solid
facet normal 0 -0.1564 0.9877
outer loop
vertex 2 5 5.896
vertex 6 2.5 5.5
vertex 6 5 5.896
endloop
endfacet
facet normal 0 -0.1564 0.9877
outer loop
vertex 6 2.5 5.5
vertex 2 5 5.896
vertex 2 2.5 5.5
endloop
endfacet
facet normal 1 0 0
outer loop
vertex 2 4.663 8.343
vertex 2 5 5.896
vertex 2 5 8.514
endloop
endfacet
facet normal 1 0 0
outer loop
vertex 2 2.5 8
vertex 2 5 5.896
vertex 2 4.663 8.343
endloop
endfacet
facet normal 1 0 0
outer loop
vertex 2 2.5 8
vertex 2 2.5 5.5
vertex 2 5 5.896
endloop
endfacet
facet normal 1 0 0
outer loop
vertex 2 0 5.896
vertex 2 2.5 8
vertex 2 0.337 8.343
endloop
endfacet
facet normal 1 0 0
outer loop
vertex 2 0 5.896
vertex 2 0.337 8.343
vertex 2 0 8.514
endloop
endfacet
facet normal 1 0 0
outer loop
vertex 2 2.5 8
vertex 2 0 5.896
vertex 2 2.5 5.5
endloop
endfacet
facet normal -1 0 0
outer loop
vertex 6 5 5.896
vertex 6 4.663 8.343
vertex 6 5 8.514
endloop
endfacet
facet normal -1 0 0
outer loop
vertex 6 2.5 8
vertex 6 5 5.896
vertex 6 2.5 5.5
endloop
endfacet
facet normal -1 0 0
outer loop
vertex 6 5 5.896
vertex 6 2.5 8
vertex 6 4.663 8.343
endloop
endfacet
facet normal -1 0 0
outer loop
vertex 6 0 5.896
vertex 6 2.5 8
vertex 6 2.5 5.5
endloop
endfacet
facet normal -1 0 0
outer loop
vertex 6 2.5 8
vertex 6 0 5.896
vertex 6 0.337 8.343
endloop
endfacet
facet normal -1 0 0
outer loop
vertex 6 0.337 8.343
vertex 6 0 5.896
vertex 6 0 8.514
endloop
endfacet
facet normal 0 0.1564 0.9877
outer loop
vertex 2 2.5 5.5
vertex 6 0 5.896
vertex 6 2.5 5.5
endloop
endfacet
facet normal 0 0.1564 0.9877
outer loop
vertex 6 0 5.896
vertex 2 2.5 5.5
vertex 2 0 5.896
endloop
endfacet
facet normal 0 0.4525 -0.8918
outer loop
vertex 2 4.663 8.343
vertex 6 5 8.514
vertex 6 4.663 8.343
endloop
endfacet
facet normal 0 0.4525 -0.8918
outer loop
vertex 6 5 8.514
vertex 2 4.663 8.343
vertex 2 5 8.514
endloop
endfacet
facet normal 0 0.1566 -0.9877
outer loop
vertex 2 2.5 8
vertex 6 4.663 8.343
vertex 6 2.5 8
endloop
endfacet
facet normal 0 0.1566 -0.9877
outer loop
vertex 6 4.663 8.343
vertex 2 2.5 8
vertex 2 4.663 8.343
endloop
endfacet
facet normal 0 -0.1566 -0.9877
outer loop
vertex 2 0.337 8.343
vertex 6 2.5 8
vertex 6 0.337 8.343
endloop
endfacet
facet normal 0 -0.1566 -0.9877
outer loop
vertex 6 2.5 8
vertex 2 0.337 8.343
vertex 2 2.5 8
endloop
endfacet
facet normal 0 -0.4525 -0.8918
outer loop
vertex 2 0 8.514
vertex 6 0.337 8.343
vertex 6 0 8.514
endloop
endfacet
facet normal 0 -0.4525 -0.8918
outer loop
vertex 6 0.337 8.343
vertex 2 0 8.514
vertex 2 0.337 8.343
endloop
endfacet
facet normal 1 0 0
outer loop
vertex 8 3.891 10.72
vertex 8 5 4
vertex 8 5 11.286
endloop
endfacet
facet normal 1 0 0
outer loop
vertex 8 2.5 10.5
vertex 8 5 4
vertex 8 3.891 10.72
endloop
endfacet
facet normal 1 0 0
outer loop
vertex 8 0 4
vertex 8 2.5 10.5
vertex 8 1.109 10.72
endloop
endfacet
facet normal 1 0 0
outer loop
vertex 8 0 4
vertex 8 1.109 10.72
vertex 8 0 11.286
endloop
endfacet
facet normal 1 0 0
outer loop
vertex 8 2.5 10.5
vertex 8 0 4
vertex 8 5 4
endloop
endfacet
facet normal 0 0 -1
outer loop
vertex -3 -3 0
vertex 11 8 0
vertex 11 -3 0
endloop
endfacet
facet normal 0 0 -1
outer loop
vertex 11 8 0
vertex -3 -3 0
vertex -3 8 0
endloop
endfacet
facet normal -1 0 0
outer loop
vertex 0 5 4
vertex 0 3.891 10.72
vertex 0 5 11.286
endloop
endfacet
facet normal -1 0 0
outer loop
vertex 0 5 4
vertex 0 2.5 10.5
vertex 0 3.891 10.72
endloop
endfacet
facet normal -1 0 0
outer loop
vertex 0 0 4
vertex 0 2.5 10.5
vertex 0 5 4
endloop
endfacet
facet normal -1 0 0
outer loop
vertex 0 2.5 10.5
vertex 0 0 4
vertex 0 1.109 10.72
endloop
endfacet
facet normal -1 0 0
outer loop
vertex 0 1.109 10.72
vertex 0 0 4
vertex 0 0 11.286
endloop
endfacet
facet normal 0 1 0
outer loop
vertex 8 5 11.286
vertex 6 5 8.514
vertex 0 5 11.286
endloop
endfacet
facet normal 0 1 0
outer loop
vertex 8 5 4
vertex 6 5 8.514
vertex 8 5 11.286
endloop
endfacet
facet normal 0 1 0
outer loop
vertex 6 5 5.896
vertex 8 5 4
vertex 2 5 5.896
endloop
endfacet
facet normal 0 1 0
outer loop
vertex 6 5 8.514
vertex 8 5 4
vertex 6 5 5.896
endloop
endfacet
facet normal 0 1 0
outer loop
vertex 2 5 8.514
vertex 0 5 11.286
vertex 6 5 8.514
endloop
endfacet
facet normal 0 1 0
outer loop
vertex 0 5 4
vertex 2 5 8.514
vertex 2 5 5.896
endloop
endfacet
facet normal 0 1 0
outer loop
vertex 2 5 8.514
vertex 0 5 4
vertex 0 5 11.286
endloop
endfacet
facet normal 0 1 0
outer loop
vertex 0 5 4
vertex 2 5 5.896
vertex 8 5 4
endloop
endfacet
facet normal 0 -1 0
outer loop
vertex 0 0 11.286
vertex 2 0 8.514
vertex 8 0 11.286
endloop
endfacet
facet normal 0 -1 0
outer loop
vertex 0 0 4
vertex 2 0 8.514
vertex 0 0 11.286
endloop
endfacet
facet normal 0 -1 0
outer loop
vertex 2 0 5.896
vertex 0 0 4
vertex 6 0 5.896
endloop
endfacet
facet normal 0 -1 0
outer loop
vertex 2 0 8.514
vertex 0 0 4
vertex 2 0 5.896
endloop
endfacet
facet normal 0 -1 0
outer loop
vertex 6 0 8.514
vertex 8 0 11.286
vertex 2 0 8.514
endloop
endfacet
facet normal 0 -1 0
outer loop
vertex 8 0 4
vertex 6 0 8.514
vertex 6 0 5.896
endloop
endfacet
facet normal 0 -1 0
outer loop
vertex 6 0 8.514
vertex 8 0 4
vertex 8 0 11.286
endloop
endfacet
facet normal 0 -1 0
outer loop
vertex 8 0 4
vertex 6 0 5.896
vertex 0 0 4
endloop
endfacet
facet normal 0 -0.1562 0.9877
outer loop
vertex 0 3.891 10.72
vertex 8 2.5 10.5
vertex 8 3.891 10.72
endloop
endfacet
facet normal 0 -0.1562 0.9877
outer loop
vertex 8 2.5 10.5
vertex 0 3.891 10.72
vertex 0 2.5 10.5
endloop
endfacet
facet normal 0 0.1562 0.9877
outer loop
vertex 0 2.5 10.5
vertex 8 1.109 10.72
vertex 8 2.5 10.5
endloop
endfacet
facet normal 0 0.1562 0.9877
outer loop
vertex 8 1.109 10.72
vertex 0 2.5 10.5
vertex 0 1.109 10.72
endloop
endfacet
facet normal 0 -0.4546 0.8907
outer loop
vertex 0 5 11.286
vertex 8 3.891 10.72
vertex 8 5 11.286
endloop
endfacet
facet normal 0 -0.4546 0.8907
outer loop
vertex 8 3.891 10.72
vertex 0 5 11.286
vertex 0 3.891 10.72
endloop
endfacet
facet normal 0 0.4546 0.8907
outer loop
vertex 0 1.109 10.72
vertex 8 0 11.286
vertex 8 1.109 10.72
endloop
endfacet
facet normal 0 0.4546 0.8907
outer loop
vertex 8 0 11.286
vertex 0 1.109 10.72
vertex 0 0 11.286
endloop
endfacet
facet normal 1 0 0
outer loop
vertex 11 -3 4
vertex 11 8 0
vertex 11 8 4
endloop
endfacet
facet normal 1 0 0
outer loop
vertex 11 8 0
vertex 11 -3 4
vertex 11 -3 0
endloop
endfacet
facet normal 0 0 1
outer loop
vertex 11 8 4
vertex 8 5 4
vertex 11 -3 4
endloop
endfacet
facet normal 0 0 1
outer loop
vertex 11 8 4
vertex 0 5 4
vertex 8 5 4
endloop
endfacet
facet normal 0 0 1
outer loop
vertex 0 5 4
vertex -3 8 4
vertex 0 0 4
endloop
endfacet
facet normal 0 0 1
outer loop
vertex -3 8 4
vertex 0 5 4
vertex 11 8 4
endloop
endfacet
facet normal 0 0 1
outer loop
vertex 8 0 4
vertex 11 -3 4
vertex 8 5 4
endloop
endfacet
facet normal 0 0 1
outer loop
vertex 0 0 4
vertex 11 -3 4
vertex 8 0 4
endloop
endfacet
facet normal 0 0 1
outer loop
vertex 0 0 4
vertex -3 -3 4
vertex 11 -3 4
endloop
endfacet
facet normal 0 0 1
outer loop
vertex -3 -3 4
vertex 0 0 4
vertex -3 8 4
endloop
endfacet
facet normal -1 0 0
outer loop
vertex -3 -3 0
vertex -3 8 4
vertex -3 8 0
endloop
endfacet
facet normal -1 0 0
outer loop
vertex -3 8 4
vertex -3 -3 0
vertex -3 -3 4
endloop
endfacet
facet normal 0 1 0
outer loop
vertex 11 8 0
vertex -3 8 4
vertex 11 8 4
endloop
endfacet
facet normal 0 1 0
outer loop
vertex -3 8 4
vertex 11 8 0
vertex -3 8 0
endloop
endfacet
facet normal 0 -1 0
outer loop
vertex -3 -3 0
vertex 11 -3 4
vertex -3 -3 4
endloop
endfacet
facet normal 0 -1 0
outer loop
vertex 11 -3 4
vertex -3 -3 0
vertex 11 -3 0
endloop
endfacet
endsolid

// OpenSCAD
h = 13;
s = 5;
del_s = 3;
r = s / 2 + 2;

del_r = 5;

h_ring = 4;
w_ring = 2.5;

del_h = 2;

render( convexity = 10 ) {

    translate( [ -del_s , -del_s, 0] )
        cube( [ s + 3 * del_s, s + 2 * del_s, 4 ] );
    difference(){
        cube( [ s + del_s, s, h ]  );
        translate( [ -1, s / 2, h + del_h ] )
            rotate( 90, [ 0, 1, 0 ] )
                cylinder( r = r, h = s + del_s + 2, $fn = 20 );
        
        // ring
        translate( [ ( s + del_s - h_ring ) / 2, s/2, h + del_h ] )
        rotate( 90, [ 0, 1, 0 ] )
        difference(){
            cylinder( r = r + del_r, h = h_ring, $fn = 20 );
            translate( [ 0, 0, -1 ] )
            cylinder( r = r + del_r - w_ring, h = h_ring + 2, $fn = 20 );
        }
    }
}
